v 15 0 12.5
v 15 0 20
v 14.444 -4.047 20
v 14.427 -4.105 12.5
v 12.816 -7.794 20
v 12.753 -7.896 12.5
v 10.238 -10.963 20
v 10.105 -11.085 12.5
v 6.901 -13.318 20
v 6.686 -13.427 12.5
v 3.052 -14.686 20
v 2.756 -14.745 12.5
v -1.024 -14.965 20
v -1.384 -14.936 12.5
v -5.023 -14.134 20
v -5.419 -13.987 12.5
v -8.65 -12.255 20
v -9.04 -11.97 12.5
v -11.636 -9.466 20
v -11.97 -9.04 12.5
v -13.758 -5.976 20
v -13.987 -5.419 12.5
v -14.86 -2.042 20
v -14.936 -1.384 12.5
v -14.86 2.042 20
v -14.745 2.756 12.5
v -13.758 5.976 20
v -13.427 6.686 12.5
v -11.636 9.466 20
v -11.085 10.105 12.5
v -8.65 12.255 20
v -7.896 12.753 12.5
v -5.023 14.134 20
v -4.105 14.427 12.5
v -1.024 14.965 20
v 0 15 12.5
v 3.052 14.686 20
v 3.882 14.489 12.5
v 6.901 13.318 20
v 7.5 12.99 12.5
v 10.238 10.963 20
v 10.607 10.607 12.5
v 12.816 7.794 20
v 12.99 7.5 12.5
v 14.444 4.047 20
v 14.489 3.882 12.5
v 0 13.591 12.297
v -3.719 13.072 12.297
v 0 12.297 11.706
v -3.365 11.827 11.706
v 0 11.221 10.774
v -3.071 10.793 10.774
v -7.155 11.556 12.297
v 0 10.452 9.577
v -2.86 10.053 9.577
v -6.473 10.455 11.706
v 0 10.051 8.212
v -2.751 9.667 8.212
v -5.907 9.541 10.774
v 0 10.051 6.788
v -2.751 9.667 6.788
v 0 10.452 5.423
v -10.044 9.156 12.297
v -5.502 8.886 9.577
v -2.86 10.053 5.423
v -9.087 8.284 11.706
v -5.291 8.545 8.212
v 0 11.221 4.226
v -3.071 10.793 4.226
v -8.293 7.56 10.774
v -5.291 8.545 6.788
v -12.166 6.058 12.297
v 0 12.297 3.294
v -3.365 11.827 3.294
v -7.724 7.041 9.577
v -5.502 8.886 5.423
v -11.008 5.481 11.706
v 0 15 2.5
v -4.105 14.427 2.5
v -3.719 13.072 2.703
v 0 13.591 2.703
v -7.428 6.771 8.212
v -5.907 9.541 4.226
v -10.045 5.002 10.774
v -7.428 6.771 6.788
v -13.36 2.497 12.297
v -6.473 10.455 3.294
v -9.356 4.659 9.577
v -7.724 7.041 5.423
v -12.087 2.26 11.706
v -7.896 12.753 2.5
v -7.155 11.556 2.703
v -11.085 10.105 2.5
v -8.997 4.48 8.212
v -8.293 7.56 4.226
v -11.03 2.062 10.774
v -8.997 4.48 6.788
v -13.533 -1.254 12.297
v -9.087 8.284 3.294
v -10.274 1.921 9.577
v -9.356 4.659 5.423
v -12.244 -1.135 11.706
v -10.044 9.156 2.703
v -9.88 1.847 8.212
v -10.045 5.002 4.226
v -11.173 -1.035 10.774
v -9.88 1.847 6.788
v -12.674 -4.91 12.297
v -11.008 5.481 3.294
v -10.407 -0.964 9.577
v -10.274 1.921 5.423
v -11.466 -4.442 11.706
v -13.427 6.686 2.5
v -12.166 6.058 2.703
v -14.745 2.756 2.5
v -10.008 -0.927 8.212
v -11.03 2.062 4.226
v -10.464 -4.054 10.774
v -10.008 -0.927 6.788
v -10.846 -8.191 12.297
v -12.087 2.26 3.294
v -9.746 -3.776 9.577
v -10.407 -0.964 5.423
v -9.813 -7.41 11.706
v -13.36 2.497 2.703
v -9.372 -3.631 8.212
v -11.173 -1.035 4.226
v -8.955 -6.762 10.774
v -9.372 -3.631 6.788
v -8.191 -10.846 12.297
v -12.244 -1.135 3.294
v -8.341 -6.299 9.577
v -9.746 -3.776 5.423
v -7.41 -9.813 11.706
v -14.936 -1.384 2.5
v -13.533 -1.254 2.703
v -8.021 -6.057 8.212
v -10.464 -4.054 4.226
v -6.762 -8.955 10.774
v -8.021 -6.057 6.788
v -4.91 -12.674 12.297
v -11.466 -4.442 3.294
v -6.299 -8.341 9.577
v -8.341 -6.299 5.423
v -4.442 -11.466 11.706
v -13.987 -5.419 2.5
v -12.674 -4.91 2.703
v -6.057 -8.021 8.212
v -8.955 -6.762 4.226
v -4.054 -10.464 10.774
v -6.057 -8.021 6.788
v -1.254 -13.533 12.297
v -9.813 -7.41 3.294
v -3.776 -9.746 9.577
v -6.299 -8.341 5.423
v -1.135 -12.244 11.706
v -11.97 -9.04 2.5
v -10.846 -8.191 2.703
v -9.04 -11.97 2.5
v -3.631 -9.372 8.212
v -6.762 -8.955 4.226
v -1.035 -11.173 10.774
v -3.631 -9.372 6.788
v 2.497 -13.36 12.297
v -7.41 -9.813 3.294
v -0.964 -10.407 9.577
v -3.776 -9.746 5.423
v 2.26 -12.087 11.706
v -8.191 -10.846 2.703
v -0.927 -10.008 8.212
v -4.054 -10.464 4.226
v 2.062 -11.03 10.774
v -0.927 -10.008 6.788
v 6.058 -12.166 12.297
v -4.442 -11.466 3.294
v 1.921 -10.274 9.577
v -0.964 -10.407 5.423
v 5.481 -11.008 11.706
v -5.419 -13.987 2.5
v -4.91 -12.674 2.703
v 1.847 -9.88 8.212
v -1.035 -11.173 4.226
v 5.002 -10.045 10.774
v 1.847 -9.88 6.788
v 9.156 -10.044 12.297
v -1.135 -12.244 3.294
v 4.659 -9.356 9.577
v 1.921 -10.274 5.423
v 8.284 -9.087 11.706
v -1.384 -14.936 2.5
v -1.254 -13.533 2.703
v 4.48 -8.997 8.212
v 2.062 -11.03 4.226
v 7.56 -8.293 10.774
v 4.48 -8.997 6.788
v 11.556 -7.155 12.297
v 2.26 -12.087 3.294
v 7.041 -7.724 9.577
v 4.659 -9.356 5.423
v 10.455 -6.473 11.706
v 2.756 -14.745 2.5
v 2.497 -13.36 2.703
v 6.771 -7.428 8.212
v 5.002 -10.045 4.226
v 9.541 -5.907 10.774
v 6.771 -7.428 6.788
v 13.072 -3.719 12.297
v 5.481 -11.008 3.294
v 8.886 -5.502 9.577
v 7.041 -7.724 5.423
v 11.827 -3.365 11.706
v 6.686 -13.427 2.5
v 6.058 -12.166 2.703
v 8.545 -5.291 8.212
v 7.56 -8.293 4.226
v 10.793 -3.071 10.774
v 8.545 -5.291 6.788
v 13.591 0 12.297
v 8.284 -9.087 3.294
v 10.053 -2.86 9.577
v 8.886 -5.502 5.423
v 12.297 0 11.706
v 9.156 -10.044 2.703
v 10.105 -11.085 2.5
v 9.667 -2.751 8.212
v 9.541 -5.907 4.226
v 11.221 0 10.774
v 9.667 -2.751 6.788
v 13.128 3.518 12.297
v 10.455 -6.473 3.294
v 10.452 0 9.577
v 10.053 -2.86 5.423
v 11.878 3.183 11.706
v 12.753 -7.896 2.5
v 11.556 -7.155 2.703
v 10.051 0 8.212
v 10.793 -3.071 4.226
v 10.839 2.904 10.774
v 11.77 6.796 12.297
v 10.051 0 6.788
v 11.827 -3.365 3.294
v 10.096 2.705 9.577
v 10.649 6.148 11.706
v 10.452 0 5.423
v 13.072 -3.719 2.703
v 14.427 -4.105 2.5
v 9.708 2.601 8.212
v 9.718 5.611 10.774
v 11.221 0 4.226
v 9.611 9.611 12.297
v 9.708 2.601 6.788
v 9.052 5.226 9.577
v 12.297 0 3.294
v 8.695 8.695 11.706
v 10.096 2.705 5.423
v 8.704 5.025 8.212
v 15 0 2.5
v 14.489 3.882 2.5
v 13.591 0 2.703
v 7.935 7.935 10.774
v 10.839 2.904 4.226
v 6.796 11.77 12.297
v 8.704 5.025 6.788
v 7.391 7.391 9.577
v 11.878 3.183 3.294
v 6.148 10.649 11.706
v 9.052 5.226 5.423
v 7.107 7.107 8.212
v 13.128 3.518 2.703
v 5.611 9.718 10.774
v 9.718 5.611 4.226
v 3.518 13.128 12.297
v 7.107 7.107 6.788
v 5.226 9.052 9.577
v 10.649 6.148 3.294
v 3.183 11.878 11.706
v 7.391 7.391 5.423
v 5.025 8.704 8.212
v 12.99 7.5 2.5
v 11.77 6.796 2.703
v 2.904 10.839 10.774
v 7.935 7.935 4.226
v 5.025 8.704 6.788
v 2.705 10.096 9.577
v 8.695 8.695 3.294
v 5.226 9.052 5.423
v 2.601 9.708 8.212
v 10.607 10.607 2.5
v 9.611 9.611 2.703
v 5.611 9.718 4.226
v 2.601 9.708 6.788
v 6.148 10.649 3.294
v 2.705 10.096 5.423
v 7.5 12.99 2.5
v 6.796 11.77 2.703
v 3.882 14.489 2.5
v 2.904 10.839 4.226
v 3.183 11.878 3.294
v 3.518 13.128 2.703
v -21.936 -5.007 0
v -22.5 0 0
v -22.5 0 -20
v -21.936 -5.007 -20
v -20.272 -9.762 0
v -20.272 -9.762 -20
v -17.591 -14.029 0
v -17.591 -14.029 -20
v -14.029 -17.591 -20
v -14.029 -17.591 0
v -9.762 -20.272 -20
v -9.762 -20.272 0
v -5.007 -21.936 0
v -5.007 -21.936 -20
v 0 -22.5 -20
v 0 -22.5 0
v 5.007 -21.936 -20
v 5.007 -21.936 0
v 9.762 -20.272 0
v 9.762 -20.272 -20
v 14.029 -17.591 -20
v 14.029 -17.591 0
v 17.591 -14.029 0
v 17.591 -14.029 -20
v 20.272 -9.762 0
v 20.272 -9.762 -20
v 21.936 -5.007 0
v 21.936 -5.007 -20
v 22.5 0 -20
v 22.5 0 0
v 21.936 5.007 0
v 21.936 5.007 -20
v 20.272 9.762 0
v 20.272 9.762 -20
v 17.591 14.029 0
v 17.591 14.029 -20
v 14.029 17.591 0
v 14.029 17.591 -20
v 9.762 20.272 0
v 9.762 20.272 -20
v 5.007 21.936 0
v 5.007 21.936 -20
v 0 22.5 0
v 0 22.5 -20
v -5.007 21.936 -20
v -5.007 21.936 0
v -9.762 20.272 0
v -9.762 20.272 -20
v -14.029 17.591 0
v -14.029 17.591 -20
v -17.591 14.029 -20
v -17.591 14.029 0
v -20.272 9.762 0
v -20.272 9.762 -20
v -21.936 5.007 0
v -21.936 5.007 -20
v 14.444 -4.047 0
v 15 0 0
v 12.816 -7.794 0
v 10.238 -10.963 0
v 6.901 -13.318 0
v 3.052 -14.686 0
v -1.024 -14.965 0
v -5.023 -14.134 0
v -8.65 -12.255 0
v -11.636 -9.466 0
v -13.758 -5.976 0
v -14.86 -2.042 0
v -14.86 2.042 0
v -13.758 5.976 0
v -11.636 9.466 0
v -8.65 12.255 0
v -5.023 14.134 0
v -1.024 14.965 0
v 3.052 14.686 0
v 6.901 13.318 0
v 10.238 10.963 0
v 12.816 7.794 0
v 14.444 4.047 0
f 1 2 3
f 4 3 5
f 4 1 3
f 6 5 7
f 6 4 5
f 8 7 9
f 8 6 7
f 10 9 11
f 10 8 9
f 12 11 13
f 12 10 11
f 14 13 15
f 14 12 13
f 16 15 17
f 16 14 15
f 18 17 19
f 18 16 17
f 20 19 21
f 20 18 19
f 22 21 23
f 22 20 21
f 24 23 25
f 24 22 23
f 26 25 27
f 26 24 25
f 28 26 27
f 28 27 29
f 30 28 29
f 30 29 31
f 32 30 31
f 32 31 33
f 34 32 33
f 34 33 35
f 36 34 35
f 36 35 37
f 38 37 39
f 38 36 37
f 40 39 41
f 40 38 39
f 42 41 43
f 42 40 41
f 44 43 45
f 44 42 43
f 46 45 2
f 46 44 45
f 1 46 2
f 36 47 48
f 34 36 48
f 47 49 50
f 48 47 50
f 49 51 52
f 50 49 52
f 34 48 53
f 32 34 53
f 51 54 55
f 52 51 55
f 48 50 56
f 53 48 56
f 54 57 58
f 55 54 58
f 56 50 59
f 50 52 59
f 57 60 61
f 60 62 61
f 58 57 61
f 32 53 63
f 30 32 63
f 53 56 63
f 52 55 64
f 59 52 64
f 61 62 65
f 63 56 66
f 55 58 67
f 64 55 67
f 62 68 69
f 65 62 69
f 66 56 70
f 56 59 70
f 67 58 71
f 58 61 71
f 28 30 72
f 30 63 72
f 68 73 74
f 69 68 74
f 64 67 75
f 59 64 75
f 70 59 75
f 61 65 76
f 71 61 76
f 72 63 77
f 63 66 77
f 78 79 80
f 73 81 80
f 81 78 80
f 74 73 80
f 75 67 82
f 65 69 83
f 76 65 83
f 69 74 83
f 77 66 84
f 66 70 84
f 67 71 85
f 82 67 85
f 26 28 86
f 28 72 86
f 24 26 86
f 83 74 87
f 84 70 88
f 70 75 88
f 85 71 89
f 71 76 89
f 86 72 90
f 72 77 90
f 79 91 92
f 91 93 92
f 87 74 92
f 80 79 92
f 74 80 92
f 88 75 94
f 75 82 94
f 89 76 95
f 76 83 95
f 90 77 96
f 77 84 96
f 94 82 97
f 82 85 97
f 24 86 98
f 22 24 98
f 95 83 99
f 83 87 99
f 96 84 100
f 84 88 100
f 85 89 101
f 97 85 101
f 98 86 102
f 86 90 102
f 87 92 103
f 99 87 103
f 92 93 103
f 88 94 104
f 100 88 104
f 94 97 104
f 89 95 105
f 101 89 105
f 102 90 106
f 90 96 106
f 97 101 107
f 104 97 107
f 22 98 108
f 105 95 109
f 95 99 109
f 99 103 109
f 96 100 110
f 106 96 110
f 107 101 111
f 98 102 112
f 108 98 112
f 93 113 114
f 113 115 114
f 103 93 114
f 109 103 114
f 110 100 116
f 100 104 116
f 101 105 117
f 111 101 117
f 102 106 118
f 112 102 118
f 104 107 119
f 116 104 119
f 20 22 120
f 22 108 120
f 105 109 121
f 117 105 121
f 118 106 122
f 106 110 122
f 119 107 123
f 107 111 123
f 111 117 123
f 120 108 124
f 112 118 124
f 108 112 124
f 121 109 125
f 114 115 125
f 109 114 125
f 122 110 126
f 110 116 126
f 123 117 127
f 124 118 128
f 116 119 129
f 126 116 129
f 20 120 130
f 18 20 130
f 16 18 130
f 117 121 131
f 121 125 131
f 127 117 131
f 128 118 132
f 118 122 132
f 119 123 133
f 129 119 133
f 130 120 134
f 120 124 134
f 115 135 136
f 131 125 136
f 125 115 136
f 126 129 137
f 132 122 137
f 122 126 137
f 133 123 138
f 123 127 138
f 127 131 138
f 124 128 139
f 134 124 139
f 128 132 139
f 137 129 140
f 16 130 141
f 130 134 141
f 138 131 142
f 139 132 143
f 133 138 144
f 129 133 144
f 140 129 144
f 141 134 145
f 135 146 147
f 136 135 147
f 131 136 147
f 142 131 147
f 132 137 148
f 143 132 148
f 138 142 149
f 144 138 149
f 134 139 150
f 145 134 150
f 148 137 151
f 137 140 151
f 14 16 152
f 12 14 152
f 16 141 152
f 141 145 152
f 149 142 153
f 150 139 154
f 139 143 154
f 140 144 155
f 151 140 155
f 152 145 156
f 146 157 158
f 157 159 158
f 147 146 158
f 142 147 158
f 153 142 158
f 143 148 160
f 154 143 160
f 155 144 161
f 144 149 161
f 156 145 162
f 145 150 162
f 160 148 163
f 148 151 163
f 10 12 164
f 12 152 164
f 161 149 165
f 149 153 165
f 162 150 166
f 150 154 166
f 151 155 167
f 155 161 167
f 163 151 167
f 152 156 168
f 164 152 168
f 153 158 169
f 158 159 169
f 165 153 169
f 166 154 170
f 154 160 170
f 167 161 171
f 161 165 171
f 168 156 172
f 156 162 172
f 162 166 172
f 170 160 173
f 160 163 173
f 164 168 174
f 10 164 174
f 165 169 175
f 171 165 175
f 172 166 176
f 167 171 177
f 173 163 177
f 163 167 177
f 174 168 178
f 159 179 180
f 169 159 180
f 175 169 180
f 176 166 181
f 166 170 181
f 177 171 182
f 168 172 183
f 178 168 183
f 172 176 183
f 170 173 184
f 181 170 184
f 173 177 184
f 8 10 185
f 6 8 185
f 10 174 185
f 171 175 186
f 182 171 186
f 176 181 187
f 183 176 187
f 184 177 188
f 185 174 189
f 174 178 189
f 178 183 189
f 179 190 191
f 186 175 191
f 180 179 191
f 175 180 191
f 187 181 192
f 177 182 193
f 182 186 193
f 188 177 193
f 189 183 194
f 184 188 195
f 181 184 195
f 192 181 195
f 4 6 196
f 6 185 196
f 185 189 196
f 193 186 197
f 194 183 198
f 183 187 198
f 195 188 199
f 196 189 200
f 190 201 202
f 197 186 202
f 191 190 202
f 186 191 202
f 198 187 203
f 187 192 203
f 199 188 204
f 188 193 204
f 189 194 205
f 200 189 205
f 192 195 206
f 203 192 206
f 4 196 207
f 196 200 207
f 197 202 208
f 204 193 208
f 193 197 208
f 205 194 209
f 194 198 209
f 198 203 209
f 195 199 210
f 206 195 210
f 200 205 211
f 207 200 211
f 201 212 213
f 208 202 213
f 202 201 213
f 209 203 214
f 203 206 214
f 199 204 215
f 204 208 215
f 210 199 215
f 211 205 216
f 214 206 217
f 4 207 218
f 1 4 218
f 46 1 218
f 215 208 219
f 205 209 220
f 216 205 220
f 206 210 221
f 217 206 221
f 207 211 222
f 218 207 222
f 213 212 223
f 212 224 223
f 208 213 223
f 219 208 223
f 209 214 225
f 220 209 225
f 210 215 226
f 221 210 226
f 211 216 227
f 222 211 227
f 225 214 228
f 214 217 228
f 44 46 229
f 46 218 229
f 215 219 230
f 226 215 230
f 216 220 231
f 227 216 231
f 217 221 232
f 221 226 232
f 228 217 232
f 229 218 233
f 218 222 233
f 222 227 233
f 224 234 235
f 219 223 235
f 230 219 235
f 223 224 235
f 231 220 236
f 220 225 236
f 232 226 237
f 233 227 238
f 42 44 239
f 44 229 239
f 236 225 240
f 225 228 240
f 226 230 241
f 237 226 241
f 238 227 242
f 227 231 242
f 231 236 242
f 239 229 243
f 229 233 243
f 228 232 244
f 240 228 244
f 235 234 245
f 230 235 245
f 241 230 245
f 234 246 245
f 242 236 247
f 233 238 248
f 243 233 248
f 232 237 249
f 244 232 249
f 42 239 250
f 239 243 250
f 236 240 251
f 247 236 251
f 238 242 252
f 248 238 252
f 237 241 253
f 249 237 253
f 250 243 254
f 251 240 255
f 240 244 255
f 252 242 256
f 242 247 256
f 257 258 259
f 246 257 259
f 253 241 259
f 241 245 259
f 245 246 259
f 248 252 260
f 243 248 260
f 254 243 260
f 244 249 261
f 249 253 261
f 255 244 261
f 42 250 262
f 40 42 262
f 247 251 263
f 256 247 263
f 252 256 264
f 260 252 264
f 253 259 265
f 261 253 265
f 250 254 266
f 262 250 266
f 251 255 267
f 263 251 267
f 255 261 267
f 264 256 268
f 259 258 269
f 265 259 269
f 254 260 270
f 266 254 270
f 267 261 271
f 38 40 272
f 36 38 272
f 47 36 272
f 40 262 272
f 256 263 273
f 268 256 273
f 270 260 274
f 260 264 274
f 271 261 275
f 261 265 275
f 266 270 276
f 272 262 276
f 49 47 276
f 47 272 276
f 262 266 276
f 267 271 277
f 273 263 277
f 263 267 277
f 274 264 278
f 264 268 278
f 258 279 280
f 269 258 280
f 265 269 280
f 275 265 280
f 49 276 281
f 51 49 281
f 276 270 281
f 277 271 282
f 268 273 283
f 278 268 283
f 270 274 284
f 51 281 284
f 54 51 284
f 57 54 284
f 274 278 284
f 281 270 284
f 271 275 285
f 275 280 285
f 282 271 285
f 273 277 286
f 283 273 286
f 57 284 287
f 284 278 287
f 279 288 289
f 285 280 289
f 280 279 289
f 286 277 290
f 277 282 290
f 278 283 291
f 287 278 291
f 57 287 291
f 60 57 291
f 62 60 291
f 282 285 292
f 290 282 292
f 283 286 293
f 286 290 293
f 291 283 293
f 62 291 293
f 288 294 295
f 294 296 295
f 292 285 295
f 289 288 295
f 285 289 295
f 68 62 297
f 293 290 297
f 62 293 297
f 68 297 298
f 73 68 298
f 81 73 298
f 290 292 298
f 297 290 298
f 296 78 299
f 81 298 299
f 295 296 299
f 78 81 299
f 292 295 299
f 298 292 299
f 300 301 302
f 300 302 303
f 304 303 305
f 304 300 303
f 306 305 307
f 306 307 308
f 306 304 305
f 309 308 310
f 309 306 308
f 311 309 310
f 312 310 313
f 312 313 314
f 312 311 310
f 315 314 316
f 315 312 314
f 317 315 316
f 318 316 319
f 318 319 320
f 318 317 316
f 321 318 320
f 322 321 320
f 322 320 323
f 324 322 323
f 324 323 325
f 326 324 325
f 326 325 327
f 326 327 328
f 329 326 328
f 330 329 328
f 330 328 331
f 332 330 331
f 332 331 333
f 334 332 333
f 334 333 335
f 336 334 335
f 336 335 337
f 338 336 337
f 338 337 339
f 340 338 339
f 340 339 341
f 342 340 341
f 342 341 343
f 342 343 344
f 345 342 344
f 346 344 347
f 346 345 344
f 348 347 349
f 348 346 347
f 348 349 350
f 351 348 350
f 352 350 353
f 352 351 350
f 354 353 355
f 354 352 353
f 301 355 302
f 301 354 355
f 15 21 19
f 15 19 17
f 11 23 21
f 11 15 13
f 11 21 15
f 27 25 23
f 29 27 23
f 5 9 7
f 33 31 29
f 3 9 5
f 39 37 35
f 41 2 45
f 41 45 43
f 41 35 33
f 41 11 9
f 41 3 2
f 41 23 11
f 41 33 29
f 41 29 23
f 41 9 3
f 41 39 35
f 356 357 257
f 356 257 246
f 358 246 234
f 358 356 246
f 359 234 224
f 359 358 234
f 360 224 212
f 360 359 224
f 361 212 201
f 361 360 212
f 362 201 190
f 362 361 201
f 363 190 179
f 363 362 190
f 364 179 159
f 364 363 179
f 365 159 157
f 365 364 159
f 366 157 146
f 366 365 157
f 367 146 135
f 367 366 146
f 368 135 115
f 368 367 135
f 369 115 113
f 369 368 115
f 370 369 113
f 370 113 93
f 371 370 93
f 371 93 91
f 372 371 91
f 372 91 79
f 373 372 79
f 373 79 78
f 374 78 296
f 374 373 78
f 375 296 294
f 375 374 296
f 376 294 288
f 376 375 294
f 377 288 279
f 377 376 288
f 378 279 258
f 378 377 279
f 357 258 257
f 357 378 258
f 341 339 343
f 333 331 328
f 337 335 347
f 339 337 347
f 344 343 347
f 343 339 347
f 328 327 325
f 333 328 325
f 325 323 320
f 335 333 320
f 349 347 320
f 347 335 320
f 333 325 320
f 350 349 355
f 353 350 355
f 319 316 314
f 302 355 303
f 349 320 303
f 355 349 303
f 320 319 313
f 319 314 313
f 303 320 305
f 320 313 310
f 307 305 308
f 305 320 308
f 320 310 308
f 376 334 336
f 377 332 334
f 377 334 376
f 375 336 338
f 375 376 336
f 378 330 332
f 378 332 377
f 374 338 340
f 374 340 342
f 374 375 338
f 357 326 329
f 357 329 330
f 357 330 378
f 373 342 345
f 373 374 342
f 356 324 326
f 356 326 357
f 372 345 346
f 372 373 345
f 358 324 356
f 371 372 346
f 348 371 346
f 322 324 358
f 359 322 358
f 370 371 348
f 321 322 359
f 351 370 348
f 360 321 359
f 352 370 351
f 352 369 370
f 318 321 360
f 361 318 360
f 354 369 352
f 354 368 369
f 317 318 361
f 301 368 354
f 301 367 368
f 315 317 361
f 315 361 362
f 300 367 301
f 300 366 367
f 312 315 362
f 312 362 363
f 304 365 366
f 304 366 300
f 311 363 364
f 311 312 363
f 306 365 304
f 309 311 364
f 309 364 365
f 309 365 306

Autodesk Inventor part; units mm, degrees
ref_plane "XZ Plane" through (0, 0, 0) normal (0, 1, 0) x (-1, 0, 0)
ref_plane "XY Plane" through (0, 0, 0) normal (0, 0, 1) x (1, 0, 0)
sketch "Skizze1" plane through (0, 0, 0) normal (0, 0, 1) x (-1, 0, 0)
  circle A0 centre (0, 0) radius 22.5
  dimension "d0" = 45
extrude "Extrusion1" add sketch "Skizze1" against normal blind 20
sketch "Skizze3" plane through (0, 0, 0) normal (0, 0, 1) x (1, 0, 0)
  circle A0 centre (0, 0) radius 15
  dimension "d3" = 30
extrude "Extrusion2" add sketch "Skizze3" along normal blind 20
ref_plane "Arbeitsebene1" through (0, 0, 0) normal (1, 0, 0) x (0, 1, 0)
sketch "Skizze5" plane through (0, 0, 0) normal (1, 0, 0) x (0, 1, 0)
  line L0 (-22.5, -20) -> (22.5, -20) projected
  line L1 (0, -20) -> (0, 20)
  line L2 (15, 20) -> (-15, 20) projected
  line L3 (10, 20) -> (10, 1.8057) construction
  line L4 (10, 2.5) -> (10, 12.5)
  line L5 (15, 2.5) -> (15, 12.5)
  line L6 (15, 0) -> (15, 20) projected
  arc A0 (15, 12.5) -> (15, 2.5) centre (15, 7.5) ccw
  point P0 (0, 0)
  point P1 (10, 7.5)
  dimension "d8" = 20
  dimension "d10" = 7.5
  dimension "d13" = 5
revolve "Umdrehung1" cut sketch "Skizze5" angle 360 about axis through (0, 0, -20) along (0, 0, 1)
properties part number "7"
